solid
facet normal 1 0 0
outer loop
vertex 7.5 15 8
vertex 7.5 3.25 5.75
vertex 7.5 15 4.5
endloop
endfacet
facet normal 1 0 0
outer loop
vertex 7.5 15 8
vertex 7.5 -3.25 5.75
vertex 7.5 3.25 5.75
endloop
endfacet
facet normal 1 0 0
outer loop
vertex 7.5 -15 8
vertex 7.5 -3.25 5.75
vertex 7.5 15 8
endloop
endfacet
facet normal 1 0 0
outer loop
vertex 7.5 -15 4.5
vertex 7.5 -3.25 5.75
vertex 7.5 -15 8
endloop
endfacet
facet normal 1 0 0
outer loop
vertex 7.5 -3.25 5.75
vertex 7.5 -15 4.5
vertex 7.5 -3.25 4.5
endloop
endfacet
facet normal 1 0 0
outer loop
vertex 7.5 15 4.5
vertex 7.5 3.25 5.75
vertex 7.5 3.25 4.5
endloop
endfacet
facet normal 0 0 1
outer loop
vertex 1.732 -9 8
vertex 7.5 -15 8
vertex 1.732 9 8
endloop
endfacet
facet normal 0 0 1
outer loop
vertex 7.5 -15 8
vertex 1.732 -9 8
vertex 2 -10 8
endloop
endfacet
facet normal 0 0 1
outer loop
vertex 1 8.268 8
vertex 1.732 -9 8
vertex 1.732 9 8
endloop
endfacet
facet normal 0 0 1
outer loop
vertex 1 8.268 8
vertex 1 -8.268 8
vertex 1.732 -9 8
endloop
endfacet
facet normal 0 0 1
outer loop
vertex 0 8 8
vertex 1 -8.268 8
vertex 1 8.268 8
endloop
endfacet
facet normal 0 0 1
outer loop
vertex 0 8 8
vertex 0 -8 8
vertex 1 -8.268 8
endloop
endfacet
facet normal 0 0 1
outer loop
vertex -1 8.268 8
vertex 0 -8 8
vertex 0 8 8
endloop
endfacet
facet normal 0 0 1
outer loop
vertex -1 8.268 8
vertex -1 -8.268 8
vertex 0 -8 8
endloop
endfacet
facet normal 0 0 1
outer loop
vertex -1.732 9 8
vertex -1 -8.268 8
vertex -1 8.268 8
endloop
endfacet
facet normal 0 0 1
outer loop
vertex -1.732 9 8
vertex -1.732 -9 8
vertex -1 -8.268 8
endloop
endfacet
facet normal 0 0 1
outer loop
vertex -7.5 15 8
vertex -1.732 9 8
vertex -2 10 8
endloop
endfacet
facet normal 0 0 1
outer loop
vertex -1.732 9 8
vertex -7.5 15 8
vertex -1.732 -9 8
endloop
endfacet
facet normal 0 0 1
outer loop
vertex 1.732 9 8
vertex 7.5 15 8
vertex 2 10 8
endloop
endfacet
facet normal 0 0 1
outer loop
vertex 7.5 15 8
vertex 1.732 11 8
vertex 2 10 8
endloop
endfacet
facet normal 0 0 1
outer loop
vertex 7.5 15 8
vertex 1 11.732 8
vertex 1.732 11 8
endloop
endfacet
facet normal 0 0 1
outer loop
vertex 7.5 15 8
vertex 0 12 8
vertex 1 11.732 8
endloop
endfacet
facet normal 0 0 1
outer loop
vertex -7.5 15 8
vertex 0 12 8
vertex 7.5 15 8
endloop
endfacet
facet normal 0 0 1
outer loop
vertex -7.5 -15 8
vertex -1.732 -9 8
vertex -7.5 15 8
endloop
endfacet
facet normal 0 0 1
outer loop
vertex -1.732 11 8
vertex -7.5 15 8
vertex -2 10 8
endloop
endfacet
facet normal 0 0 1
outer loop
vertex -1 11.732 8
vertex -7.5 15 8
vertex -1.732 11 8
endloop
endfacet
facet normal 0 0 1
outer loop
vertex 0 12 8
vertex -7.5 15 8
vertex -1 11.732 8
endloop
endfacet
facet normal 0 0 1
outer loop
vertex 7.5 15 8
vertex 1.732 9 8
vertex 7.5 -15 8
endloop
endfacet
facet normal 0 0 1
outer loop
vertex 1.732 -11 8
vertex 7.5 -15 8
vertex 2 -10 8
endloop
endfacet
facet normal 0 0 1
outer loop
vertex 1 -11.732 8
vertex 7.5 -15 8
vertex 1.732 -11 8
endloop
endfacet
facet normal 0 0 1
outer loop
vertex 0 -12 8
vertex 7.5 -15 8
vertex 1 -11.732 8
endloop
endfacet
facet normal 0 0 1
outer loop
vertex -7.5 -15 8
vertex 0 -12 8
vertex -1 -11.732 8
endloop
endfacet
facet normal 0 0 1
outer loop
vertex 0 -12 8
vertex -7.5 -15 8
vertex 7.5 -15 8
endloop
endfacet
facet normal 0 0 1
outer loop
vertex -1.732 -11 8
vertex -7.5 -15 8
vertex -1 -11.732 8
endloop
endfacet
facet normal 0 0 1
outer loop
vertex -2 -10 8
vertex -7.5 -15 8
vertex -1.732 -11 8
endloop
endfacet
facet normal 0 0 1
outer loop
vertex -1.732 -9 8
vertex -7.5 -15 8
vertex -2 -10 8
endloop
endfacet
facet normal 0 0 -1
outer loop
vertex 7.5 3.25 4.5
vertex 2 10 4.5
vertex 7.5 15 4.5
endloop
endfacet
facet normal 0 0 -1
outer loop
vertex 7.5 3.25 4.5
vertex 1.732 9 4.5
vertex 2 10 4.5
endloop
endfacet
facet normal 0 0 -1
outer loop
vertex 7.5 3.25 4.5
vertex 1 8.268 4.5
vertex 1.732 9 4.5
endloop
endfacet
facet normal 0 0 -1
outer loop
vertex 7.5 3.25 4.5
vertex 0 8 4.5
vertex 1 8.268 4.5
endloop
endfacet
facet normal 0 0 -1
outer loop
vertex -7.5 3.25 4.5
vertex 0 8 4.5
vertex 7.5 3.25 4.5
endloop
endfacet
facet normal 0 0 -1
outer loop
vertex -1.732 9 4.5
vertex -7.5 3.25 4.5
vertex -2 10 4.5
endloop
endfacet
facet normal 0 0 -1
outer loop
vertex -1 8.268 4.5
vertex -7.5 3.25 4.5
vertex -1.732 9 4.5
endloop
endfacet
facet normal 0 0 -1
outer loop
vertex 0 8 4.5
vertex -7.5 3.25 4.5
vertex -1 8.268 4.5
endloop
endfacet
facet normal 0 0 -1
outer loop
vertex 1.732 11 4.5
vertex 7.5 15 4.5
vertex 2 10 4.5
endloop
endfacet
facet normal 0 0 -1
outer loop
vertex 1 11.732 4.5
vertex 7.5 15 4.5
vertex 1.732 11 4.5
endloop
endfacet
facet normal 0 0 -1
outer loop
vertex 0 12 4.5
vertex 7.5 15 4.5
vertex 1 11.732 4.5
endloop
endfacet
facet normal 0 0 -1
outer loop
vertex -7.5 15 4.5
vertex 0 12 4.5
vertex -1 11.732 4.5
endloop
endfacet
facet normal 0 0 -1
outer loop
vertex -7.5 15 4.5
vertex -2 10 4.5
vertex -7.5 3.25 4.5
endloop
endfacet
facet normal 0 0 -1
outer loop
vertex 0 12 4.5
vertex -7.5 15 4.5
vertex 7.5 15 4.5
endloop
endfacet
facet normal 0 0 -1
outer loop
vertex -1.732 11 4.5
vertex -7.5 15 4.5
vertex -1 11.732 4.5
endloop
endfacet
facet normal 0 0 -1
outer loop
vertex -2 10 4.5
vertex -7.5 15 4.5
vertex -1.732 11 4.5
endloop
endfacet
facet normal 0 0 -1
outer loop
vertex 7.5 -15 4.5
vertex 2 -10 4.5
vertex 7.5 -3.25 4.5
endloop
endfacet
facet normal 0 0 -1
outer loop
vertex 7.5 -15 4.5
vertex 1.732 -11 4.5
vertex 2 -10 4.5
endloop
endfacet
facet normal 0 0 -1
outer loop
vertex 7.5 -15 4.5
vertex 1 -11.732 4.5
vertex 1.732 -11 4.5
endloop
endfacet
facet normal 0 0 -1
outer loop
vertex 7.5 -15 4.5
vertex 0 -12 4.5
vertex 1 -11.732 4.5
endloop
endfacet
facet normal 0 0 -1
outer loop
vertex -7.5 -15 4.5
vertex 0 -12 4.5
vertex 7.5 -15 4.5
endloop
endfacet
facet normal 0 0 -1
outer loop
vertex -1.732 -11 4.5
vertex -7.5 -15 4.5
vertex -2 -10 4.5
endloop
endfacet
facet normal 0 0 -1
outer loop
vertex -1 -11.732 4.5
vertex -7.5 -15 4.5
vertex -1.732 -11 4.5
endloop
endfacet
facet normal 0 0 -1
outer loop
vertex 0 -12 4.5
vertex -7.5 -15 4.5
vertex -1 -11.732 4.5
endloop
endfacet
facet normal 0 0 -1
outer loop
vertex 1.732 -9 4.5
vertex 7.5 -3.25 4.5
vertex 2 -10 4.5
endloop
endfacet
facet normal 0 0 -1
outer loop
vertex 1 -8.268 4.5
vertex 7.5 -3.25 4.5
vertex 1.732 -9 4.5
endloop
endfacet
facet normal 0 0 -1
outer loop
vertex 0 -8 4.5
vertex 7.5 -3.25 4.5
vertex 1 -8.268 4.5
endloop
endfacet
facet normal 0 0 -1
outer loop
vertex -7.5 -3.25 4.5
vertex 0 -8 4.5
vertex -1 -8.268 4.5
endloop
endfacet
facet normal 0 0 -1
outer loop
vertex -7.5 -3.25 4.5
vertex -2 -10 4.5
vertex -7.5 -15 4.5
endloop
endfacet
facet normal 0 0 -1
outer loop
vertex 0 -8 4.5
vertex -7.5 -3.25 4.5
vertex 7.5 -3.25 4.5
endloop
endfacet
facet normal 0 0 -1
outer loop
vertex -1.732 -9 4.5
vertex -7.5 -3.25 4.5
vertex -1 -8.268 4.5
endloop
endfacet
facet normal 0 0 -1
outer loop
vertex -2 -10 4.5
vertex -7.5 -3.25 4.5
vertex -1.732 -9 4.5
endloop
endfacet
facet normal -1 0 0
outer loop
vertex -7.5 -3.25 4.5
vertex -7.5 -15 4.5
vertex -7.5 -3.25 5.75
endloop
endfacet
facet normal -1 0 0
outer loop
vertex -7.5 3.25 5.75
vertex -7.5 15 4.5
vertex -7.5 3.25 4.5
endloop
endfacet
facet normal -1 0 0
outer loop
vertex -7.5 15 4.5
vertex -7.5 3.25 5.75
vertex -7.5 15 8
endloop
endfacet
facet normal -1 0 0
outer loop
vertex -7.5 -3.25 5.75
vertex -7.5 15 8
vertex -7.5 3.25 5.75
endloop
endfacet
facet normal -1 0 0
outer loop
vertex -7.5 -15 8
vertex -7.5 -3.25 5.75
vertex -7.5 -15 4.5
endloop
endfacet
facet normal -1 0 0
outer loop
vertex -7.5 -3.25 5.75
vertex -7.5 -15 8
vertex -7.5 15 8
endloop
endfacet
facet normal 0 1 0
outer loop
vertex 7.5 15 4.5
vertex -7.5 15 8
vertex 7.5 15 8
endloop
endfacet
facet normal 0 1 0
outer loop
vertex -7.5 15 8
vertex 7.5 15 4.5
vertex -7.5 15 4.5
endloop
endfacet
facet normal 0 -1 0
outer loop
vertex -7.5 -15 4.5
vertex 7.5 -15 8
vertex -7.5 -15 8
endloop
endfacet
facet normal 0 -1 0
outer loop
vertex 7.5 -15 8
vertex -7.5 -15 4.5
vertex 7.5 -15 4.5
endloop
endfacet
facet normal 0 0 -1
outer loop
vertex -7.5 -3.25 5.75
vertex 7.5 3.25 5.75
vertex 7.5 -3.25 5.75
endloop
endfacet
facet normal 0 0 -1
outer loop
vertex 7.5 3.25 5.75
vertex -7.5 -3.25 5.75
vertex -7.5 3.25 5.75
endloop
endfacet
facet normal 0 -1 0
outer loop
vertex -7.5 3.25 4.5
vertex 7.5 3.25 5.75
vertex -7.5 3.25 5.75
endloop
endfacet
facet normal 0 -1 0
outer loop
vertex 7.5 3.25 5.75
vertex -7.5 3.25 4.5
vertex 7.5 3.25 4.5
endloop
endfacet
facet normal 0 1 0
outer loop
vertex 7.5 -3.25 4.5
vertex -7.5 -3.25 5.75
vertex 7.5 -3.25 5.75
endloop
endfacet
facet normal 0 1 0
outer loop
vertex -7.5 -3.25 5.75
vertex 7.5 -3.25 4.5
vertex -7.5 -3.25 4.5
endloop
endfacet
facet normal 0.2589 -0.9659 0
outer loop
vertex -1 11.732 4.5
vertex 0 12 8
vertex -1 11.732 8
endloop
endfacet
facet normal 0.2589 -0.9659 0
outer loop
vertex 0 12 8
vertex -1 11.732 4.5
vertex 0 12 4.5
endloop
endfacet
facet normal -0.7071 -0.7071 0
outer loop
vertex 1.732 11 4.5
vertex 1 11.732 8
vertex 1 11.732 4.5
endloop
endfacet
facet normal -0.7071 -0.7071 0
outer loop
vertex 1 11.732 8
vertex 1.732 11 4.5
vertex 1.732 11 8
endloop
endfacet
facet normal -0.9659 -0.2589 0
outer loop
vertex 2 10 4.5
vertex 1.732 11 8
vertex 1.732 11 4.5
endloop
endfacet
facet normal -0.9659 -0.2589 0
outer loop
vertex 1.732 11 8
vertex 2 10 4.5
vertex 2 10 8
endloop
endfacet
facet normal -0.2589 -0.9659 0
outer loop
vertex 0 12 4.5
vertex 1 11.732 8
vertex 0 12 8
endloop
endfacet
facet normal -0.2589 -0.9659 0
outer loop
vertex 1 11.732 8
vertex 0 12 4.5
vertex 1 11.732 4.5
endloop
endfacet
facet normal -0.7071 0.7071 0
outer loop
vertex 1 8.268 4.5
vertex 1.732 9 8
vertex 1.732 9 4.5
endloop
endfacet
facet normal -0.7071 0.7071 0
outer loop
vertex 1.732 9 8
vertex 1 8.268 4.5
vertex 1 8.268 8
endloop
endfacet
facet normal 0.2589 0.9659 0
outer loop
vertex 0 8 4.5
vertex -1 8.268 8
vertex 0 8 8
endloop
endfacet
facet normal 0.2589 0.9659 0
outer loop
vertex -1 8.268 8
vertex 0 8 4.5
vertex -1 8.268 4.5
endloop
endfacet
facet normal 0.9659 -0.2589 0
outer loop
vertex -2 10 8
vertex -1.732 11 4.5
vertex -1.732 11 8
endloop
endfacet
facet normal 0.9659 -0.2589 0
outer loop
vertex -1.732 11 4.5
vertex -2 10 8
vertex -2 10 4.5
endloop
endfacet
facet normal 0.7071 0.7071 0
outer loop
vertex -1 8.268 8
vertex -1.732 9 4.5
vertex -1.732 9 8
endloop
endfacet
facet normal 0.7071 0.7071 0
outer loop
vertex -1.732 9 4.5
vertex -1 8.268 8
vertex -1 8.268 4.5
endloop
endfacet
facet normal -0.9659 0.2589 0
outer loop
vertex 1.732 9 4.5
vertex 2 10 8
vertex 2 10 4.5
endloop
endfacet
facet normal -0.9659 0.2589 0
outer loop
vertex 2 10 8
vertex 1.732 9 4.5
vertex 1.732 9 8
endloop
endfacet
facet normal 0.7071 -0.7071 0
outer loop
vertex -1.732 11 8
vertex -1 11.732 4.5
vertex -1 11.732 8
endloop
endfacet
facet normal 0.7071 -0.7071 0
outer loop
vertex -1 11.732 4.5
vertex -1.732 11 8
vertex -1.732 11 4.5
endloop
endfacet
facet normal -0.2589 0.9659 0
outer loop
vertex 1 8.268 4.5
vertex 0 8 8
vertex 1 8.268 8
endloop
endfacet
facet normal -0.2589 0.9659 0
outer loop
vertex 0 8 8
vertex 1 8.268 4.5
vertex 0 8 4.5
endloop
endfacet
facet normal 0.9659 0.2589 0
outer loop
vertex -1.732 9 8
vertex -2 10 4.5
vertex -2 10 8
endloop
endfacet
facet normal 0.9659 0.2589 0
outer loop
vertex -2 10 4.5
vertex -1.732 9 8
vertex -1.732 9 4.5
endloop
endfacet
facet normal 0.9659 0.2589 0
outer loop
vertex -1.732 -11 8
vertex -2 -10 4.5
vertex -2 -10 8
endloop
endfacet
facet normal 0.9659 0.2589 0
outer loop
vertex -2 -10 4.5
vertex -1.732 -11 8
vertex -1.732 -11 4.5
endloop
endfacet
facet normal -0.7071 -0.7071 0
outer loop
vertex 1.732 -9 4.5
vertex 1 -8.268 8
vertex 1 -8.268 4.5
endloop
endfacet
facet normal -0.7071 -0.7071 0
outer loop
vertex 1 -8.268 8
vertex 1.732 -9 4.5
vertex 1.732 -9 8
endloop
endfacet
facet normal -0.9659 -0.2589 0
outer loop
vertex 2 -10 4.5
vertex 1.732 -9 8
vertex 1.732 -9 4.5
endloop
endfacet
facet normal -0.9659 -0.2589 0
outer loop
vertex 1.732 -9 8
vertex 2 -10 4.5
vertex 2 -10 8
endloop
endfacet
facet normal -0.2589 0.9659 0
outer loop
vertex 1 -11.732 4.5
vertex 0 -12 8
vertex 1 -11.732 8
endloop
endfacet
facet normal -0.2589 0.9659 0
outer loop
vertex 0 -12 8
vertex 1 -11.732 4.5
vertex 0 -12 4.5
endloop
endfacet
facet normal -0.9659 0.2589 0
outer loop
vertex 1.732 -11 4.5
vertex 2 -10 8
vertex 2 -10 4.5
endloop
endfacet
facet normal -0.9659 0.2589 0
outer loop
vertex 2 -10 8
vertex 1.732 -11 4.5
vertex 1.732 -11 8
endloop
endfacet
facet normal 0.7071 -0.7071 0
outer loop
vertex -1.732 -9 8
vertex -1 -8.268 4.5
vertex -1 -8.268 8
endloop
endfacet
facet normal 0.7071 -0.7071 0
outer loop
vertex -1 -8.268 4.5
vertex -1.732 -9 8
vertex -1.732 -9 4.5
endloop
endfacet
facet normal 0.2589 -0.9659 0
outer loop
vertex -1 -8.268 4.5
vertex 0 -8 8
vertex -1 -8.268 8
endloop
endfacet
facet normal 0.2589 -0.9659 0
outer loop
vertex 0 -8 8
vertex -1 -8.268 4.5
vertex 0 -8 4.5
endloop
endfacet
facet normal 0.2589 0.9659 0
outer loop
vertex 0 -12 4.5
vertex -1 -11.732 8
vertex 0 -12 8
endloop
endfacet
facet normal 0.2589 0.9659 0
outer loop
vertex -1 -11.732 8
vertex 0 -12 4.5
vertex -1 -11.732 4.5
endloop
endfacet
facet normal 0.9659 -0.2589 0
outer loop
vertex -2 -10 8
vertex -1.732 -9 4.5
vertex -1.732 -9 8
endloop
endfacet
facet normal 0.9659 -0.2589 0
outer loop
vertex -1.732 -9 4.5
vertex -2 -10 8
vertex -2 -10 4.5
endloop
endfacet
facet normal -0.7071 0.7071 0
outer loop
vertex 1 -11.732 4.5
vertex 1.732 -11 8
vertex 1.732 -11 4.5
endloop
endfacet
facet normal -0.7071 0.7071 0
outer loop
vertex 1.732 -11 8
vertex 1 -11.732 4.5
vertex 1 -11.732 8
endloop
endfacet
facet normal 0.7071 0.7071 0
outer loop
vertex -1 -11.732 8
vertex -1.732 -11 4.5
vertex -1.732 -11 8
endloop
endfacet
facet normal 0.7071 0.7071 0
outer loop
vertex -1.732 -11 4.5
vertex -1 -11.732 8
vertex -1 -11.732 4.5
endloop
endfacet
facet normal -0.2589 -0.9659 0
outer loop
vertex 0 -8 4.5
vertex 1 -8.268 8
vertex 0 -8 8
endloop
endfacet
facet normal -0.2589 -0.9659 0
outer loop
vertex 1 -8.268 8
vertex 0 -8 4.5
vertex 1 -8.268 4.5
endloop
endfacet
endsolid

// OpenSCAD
module belt_holder_a(){
    difference(){
        translate([0,0,0.5+0.25])cube([15,30,3.5], center=true);
        translate([0,0,2])cube([32,6.5,3], center=true);
        translate([0,10,0])cylinder(h=20, d=4, center=true, $fn=12);
        translate([0,10,-1])cylinder(h=3, d=6.5, center=true, $fn=6);
        translate([0,-10,-1])cylinder(h=3, d=6.5, center=true, $fn=6);
        translate([0,-10,0])cylinder(h=20, d=4, center=true, $fn=12);
    }
        
}

module teeth(w, h, l, n){
    for (i = [0:n-1]){
        translate([i*l,0,0])rotate([-90,0,0])linear_extrude(w, center=true)polygon([[0,0], [l/2,h], [l,0]]);
    }
    
}


module belt_holder_b(){
    translate([0,0,3.5])difference(){
        union(){
            cube([15,30,2], center=true);
            translate([-5,0,-1])teeth(5, 1, 2, 5);
        }
        translate([0,10,0])cylinder(h=20, d=4, center=true, $fn=12);
        translate([0,-10,0])cylinder(h=20, d=4, center=true, $fn=12);
    }
        
}

module belt_holder_c(){
    translate([0,0,1.5+4+0.75])difference(){
        cube([15,30,3.5], center=true);
        translate([0,0,-1.5])cube([32,6.5,2], center=true);
        translate([0,10,0])cylinder(h=20, d=4, center=true, $fn=12);
        translate([0,-10,0])cylinder(h=20, d=4, center=true, $fn=12);
    }
        
}

//belt_holder_a();
//belt_holder_b();
belt_holder_c();
